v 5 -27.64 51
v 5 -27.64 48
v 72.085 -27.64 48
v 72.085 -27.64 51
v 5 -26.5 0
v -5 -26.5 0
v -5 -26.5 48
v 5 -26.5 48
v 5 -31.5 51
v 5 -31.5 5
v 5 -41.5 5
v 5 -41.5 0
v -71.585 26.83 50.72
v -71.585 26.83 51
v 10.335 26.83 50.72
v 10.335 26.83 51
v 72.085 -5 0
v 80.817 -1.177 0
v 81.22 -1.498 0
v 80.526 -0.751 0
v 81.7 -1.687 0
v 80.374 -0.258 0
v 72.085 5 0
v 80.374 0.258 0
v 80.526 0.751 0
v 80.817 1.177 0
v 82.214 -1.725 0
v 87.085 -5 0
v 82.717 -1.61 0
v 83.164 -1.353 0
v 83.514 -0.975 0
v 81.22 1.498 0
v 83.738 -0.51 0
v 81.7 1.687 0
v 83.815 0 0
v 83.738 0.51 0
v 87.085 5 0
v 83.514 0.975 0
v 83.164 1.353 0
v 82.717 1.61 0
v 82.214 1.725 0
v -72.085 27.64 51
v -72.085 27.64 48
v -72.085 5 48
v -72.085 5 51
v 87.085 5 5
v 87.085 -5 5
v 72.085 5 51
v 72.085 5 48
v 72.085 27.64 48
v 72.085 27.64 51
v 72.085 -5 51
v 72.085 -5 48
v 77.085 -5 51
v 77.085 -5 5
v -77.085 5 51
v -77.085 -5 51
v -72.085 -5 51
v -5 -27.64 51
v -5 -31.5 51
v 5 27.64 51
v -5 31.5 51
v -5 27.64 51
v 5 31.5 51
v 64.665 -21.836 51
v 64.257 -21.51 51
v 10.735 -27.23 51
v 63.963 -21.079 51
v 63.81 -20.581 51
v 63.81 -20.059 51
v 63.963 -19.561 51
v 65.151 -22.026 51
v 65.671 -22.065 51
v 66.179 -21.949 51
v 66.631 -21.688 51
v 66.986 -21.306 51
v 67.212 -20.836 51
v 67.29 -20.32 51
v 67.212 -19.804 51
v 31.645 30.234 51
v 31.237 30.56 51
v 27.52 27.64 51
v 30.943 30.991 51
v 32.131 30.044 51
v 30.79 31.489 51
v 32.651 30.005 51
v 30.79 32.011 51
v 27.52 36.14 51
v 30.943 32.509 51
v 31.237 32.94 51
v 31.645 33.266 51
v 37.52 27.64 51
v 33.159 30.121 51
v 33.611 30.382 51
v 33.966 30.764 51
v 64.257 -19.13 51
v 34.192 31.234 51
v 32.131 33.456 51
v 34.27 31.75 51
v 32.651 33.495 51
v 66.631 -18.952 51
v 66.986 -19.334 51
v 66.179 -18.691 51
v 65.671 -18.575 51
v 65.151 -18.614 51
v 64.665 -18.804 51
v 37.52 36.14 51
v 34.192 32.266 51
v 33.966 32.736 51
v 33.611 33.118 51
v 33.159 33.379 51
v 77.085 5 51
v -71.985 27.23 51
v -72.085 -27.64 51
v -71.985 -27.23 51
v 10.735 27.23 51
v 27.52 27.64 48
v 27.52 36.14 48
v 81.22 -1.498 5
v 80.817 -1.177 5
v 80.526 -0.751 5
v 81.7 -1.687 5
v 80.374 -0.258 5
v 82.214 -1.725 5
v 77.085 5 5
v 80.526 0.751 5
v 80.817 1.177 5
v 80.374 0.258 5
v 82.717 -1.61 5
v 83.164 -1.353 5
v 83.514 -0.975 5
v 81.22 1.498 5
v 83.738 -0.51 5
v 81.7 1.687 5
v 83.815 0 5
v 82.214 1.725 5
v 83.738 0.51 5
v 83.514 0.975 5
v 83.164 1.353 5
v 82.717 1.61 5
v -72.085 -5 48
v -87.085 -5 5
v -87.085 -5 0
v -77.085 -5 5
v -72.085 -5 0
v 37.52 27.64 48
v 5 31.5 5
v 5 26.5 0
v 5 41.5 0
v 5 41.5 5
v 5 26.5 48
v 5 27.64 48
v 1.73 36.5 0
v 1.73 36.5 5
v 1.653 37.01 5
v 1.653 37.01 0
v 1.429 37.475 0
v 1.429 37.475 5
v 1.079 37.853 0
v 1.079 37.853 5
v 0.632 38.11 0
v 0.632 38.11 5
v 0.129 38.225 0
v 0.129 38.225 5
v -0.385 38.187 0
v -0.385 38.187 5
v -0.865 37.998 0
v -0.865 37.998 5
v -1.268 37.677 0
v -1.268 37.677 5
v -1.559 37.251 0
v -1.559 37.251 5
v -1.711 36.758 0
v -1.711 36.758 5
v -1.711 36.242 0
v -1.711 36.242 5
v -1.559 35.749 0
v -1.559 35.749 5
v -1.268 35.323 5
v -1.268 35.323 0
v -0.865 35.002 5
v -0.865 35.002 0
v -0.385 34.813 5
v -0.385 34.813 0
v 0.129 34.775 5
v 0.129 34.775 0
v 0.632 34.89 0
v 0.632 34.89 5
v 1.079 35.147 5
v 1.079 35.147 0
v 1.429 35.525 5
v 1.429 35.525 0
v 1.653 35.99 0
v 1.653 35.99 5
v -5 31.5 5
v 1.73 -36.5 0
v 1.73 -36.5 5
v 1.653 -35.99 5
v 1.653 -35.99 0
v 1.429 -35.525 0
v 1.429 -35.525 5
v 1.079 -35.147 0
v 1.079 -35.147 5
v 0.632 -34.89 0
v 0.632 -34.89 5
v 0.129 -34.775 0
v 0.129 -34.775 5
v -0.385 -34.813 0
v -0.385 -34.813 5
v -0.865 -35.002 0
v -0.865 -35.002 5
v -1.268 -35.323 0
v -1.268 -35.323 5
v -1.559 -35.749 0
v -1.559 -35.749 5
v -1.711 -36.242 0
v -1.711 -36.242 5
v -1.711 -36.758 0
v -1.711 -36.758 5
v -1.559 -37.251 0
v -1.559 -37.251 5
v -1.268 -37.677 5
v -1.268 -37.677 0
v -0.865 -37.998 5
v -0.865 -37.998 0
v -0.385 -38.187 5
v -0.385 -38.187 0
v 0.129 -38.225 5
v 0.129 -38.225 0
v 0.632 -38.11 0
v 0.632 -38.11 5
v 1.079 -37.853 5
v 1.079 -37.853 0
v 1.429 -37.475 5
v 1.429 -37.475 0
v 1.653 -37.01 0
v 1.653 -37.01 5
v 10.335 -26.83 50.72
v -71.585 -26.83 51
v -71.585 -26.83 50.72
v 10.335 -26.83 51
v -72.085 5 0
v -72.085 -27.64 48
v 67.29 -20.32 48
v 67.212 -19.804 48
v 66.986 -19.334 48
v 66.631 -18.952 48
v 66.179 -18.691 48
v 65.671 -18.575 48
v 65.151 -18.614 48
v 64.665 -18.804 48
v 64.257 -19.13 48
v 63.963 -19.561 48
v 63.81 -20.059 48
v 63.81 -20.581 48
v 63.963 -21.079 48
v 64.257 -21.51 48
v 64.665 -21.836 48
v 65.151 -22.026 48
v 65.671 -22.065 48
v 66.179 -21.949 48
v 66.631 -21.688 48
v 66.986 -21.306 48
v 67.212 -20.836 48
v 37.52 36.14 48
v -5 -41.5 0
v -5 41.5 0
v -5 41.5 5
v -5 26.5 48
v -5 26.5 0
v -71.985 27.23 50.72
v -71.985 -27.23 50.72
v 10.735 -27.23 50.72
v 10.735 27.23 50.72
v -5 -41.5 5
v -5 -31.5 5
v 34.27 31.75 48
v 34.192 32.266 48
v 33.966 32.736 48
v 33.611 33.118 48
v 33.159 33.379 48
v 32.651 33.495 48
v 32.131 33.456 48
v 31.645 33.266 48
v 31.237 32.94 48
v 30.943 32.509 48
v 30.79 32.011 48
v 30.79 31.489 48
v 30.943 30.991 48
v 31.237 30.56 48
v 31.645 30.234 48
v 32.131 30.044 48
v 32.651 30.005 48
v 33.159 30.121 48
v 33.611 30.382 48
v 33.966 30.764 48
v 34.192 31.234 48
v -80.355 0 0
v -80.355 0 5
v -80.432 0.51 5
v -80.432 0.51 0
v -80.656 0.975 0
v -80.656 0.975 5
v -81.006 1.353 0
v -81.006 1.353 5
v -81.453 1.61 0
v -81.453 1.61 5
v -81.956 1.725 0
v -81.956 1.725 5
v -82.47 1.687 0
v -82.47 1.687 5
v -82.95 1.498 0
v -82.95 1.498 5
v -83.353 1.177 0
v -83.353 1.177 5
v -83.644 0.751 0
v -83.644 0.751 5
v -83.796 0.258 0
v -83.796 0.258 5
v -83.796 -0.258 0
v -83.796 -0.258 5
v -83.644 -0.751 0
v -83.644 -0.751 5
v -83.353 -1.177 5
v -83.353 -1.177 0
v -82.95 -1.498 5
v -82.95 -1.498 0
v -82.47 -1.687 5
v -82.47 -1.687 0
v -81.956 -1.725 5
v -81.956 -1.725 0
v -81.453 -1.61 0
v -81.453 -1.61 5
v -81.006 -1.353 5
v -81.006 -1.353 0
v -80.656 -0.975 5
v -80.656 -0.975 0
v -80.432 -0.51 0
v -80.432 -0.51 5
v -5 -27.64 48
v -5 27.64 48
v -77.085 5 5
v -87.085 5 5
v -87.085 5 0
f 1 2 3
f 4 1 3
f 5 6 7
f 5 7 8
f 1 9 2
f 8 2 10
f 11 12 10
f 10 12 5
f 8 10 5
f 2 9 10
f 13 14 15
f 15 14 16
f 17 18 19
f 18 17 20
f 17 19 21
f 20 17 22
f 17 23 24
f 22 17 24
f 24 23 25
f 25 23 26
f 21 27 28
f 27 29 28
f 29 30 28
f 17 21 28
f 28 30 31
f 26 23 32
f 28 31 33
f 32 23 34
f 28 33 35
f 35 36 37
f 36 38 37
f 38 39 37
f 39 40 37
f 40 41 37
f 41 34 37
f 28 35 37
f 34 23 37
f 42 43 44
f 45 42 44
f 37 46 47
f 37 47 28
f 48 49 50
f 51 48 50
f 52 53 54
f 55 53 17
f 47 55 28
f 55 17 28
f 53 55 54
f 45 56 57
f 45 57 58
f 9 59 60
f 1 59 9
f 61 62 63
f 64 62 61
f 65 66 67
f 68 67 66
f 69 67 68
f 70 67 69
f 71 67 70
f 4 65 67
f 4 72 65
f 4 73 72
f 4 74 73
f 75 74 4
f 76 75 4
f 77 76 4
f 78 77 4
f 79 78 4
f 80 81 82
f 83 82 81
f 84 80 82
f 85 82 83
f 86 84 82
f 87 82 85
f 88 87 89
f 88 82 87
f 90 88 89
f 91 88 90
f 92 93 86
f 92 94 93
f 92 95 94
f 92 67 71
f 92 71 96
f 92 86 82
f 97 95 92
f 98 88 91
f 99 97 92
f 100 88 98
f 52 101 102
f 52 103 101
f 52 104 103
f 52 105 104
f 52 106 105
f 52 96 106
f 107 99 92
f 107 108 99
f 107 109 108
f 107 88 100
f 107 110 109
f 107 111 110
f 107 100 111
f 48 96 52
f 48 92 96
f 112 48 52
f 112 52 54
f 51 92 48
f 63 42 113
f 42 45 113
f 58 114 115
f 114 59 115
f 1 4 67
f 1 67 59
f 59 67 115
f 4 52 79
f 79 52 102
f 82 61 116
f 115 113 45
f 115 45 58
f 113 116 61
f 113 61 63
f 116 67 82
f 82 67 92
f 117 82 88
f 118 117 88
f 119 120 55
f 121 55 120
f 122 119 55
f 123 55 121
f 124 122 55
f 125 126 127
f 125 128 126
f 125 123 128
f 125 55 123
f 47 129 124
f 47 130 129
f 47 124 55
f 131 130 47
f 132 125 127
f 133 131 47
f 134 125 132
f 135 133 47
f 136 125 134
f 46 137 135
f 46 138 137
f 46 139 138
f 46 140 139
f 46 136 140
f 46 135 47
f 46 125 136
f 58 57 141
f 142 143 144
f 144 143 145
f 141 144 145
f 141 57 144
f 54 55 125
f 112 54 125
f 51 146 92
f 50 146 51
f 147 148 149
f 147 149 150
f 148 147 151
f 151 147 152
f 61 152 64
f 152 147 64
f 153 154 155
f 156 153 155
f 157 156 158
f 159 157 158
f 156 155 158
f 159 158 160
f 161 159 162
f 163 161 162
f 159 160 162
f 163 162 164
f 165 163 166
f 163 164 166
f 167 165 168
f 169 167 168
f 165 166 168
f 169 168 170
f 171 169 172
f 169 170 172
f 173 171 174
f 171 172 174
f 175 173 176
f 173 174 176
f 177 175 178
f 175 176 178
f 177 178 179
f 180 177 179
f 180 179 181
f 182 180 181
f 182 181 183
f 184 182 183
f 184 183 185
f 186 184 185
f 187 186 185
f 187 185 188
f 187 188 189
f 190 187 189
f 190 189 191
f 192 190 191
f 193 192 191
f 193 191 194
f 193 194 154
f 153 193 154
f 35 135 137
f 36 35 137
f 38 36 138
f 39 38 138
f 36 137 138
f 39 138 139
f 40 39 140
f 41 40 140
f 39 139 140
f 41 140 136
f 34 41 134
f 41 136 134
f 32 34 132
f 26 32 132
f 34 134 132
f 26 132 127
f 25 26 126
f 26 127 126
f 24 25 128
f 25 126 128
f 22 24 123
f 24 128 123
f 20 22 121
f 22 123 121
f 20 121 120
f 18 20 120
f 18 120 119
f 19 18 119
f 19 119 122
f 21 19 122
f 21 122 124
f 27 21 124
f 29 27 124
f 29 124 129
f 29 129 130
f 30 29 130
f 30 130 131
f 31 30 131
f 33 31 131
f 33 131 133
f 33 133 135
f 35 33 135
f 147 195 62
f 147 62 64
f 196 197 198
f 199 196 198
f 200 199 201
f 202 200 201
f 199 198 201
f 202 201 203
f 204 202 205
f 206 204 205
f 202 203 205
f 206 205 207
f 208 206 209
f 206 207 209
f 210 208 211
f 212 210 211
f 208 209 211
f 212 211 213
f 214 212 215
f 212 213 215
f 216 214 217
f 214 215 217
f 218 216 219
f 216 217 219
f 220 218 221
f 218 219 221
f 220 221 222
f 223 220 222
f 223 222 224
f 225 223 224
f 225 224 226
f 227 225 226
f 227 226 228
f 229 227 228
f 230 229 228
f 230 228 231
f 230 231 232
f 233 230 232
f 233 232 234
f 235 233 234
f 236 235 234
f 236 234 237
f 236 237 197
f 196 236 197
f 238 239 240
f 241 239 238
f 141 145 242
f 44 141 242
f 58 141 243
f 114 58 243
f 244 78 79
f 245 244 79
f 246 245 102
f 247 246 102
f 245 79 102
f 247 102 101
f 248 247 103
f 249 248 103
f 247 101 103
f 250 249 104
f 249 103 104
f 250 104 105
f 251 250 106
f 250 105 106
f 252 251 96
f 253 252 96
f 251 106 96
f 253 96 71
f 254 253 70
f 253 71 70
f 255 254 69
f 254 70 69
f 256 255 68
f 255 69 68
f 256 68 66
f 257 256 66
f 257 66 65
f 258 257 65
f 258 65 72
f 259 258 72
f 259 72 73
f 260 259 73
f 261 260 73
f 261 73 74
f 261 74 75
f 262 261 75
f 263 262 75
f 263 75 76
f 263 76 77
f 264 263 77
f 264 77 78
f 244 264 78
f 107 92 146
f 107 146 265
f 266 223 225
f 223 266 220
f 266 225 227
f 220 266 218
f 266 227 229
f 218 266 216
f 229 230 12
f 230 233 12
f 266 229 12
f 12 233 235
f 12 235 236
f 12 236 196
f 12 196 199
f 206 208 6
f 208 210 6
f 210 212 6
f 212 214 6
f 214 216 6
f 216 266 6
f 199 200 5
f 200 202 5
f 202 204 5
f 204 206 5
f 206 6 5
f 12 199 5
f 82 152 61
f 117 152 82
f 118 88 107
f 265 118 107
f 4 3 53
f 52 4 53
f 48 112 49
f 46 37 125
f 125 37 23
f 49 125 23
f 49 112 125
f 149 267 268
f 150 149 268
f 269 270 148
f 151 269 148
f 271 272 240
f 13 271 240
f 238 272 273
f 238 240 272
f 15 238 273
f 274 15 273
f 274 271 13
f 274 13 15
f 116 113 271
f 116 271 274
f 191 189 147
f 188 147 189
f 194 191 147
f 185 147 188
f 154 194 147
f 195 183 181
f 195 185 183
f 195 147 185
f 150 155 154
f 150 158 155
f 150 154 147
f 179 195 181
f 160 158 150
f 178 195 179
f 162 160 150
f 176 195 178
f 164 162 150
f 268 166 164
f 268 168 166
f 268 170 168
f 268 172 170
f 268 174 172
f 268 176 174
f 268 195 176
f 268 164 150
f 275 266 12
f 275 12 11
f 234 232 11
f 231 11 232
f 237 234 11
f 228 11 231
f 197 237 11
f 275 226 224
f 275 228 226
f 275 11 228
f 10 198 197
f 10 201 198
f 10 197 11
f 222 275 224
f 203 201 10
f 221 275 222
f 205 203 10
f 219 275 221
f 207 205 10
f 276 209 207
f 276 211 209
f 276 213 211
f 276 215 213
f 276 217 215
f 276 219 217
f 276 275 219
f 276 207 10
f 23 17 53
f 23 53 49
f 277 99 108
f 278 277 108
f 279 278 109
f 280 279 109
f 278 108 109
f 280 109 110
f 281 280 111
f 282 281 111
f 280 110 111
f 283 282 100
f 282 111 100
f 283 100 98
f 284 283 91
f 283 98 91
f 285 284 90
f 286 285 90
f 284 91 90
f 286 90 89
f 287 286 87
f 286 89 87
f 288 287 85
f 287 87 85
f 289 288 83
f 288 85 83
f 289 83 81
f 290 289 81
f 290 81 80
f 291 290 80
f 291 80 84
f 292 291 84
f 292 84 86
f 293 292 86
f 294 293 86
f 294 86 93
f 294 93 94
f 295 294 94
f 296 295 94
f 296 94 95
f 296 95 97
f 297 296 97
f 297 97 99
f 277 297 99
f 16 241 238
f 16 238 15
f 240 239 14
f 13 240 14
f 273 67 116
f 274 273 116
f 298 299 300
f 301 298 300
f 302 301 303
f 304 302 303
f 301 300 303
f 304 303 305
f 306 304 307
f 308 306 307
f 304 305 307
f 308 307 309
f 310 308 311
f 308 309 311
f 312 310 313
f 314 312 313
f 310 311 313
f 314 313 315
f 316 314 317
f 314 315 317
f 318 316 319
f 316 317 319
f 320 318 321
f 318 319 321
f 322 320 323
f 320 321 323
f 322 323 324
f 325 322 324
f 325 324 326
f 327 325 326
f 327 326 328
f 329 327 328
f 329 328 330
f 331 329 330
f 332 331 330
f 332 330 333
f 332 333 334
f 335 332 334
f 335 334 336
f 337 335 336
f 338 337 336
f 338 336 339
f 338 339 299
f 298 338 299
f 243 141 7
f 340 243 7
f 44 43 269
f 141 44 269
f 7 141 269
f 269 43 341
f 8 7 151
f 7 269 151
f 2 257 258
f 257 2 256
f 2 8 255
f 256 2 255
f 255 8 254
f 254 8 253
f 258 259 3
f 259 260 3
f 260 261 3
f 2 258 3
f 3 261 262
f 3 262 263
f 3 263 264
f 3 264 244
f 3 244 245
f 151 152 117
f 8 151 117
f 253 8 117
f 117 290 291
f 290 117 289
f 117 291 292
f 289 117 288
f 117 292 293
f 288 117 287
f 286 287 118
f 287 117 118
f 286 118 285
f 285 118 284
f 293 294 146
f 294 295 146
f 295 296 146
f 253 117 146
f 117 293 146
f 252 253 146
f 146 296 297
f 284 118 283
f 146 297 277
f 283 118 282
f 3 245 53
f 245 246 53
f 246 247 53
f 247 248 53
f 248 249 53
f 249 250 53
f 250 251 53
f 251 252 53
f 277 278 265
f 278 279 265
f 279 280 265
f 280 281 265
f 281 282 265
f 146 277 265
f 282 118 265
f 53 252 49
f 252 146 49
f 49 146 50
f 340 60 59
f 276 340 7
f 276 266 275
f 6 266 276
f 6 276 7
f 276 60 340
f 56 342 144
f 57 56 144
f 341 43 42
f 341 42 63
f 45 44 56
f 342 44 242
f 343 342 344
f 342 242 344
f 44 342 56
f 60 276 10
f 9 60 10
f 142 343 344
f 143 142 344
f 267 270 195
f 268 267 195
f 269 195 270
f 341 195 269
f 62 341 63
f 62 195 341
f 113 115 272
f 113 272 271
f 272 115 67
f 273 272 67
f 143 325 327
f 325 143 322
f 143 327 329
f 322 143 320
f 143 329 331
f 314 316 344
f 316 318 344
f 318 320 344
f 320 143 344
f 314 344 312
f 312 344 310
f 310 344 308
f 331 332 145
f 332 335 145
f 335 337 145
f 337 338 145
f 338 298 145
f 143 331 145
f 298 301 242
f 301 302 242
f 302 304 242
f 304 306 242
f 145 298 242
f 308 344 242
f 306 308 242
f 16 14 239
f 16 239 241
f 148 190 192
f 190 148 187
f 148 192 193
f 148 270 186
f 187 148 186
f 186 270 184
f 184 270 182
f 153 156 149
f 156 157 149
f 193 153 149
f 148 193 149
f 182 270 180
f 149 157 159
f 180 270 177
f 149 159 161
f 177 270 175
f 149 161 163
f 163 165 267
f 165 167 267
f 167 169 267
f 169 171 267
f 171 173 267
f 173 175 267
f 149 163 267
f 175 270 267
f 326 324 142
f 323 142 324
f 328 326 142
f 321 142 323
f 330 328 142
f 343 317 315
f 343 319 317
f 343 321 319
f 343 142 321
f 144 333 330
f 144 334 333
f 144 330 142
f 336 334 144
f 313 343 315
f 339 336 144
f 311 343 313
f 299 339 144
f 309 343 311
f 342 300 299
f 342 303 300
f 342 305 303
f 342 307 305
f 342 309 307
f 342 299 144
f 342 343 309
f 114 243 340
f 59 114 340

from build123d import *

# Parameters (mm, degrees)
SKETCH2_W             = 5
SKETCH2_H             = 10
BOSS_EXTRUDE1_DEPTH   = 48
SKETCH2_W_2           = 10
SKETCH2_H_2           = 5
BOSS_EXTRUDE1_2_DEPTH = 48
BOSS_EXTRUDE1_3_DEPTH = 48
BOSS_EXTRUDE1_4_DEPTH = 48
SKETCH3_W             = 165
SKETCH3_H             = 55.28
BOSS_EXTRUDE2_DEPTH   = 3
SKETCH4_W             = 10
SKETCH4_H             = 3.86
BOSS_EXTRUDE3_DEPTH   = 3
SKETCH5_W             = 10
SKETCH5_H             = 5
BOSS_EXTRUDE4_DEPTH   = 10
SKETCH7_W             = 5
SKETCH7_H             = 10
BOSS_EXTRUDE5_DEPTH   = 10
SKETCH8_R             = 1.73
CUT_EXTRUDE1_DEPTH    = 6
SKETCH10_W            = 10
SKETCH10_H            = 8.5
SKETCH10_W_2          = 1.85
SKETCH10_H_2          = 10
BOSS_EXTRUDE6_DEPTH   = 3
SKETCH11_R            = 1.75
CUT_EXTRUDE3_DEPTH    = 52
SKETCH12_W            = 82.72
SKETCH12_H            = 54.46
SKETCH12_W_2          = 81.92
SKETCH12_H_2          = 53.66
CUT_EXTRUDE4_DEPTH    = 0.28
CUT_EXTRUDE5_DEPTH    = 4


with BuildPart() as part:
    # Sketch2 → Boss-Extrude1 (new body)
    with BuildSketch(Plane.XY):
        with Locations((-74.585, 0)):
            Rectangle(SKETCH2_W, SKETCH2_H)
    extrude(amount=BOSS_EXTRUDE1_DEPTH)



with BuildPart() as body_2:
    # Sketch2 → Boss-Extrude1 2 (new body)
    with BuildSketch(Plane.XY):
        with Locations((0, 29)):
            Rectangle(SKETCH2_W_2, SKETCH2_H_2)
    extrude(amount=BOSS_EXTRUDE1_2_DEPTH)


with BuildPart() as body_3:
    # Sketch2 → Boss-Extrude1 3 (new body)
    with BuildSketch(Plane.XY):
        with Locations((74.585, 0)):
            Rectangle(SKETCH2_W, SKETCH2_H)
    extrude(amount=BOSS_EXTRUDE1_3_DEPTH)


with BuildPart() as body_4:
    # Sketch2 → Boss-Extrude1 4 (new body)
    with BuildSketch(Plane.XY):
        with Locations((0, -29)):
            Rectangle(SKETCH2_W_2, SKETCH2_H_2)
    extrude(amount=BOSS_EXTRUDE1_4_DEPTH)


with BuildPart() as part_1:
    add(part.part)

    add(body_2.part)  # Boss-Extrude2 merges body 2

    add(body_3.part)  # Boss-Extrude2 merges body 3

    add(body_4.part)  # Boss-Extrude2 merges body 4
    # Sketch3 → Boss-Extrude2 (add)
    with BuildSketch(Plane.XY.offset(48)):
        Rectangle(SKETCH3_W, SKETCH3_H)
    extrude(amount=BOSS_EXTRUDE2_DEPTH)

    # Sketch4 → Boss-Extrude3 (add)
    with BuildSketch(Plane.XY.offset(48)):
        with Locations((0, 29.57)):
            Rectangle(SKETCH4_W, SKETCH4_H)
        with Locations((0, -29.57)):
            Rectangle(SKETCH4_W, SKETCH4_H)
    extrude(amount=BOSS_EXTRUDE3_DEPTH)

    # Sketch5 → Boss-Extrude4 (add)
    with BuildSketch(Plane(origin=(0, 5, 0), x_dir=(1, 0, 0), z_dir=(0, 1, 0))):
        with Locations((-82.085, -2.5)):
            Rectangle(SKETCH5_W, SKETCH5_H)
        with Locations((82.085, -2.5)):
            Rectangle(SKETCH5_W, SKETCH5_H)
    extrude(amount=-BOSS_EXTRUDE4_DEPTH)

    # Sketch7 → Boss-Extrude5 (add)
    with BuildSketch(Plane.ZY.offset(5)):
        with Locations((2.5, 36.5)):
            Rectangle(SKETCH7_W, SKETCH7_H)
        with Locations((2.5, -36.5)):
            Rectangle(SKETCH7_W, SKETCH7_H)
    extrude(amount=-BOSS_EXTRUDE5_DEPTH)

    # Sketch8 → Cut-Extrude1 (cut, through all)
    with BuildSketch(Plane.XY.offset(5)):
        with Locations((-82.085, 0)):
            Circle(SKETCH8_R)
        with Locations((0, -36.5)):
            Circle(SKETCH8_R)
        with Locations((82.085, 0)):
            Circle(SKETCH8_R)
        with Locations((0, 36.5)):
            Circle(SKETCH8_R)
    extrude(amount=-CUT_EXTRUDE1_DEPTH, mode=Mode.SUBTRACT)

    # Sketch10 → Boss-Extrude6 (add)
    with BuildSketch(Plane.XY.offset(51)):
        with Locations((32.52, 31.89)):
            Rectangle(SKETCH10_W, SKETCH10_H)
        with Locations((69.005, -20.32)):
            Rectangle(SKETCH10_W_2, SKETCH10_H_2)
    extrude(amount=-BOSS_EXTRUDE6_DEPTH)

    # Sketch11 → Cut-Extrude3 (cut, through all)
    with BuildSketch(Plane.XY.offset(51)):
        with Locations((32.52, 31.75)):
            Circle(SKETCH11_R)
        with Locations((65.54, -20.32)):
            Circle(SKETCH11_R)
    extrude(amount=-CUT_EXTRUDE3_DEPTH, mode=Mode.SUBTRACT)

    # Sketch12 → Cut-Extrude4 (cut)
    with BuildSketch(Plane.XY.offset(51)):
        with Locations((-30.625, 0)):
            Rectangle(SKETCH12_W, SKETCH12_H)
        with Locations((-30.625, 0)):
            Rectangle(SKETCH12_W_2, SKETCH12_H_2, mode=Mode.SUBTRACT)
    extrude(amount=-CUT_EXTRUDE4_DEPTH, mode=Mode.SUBTRACT)

    # Sketch13 → Cut-Extrude5 (cut, through all)
    with BuildSketch(Plane(origin=(0, 0, 48), x_dir=(-1, 0, 0), z_dir=(0, 0, -1))):
        Polygon((82.5, -27.64), (82.5, 27.64), (72.085, 27.64), (72.085, 5), (77.085, 5), (77.085, -5), (72.085, -5), (72.085, -27.64), align=None)
        Polygon((-82.5, 27.64), (-82.5, -27.64), (-72.085, -27.64), (-72.085, -5), (-77.085, -5), (-77.085, 5), (-72.085, 5), (-72.085, 27.64), align=None)
    extrude(amount=-CUT_EXTRUDE5_DEPTH, mode=Mode.SUBTRACT)


solid = part_1.part
